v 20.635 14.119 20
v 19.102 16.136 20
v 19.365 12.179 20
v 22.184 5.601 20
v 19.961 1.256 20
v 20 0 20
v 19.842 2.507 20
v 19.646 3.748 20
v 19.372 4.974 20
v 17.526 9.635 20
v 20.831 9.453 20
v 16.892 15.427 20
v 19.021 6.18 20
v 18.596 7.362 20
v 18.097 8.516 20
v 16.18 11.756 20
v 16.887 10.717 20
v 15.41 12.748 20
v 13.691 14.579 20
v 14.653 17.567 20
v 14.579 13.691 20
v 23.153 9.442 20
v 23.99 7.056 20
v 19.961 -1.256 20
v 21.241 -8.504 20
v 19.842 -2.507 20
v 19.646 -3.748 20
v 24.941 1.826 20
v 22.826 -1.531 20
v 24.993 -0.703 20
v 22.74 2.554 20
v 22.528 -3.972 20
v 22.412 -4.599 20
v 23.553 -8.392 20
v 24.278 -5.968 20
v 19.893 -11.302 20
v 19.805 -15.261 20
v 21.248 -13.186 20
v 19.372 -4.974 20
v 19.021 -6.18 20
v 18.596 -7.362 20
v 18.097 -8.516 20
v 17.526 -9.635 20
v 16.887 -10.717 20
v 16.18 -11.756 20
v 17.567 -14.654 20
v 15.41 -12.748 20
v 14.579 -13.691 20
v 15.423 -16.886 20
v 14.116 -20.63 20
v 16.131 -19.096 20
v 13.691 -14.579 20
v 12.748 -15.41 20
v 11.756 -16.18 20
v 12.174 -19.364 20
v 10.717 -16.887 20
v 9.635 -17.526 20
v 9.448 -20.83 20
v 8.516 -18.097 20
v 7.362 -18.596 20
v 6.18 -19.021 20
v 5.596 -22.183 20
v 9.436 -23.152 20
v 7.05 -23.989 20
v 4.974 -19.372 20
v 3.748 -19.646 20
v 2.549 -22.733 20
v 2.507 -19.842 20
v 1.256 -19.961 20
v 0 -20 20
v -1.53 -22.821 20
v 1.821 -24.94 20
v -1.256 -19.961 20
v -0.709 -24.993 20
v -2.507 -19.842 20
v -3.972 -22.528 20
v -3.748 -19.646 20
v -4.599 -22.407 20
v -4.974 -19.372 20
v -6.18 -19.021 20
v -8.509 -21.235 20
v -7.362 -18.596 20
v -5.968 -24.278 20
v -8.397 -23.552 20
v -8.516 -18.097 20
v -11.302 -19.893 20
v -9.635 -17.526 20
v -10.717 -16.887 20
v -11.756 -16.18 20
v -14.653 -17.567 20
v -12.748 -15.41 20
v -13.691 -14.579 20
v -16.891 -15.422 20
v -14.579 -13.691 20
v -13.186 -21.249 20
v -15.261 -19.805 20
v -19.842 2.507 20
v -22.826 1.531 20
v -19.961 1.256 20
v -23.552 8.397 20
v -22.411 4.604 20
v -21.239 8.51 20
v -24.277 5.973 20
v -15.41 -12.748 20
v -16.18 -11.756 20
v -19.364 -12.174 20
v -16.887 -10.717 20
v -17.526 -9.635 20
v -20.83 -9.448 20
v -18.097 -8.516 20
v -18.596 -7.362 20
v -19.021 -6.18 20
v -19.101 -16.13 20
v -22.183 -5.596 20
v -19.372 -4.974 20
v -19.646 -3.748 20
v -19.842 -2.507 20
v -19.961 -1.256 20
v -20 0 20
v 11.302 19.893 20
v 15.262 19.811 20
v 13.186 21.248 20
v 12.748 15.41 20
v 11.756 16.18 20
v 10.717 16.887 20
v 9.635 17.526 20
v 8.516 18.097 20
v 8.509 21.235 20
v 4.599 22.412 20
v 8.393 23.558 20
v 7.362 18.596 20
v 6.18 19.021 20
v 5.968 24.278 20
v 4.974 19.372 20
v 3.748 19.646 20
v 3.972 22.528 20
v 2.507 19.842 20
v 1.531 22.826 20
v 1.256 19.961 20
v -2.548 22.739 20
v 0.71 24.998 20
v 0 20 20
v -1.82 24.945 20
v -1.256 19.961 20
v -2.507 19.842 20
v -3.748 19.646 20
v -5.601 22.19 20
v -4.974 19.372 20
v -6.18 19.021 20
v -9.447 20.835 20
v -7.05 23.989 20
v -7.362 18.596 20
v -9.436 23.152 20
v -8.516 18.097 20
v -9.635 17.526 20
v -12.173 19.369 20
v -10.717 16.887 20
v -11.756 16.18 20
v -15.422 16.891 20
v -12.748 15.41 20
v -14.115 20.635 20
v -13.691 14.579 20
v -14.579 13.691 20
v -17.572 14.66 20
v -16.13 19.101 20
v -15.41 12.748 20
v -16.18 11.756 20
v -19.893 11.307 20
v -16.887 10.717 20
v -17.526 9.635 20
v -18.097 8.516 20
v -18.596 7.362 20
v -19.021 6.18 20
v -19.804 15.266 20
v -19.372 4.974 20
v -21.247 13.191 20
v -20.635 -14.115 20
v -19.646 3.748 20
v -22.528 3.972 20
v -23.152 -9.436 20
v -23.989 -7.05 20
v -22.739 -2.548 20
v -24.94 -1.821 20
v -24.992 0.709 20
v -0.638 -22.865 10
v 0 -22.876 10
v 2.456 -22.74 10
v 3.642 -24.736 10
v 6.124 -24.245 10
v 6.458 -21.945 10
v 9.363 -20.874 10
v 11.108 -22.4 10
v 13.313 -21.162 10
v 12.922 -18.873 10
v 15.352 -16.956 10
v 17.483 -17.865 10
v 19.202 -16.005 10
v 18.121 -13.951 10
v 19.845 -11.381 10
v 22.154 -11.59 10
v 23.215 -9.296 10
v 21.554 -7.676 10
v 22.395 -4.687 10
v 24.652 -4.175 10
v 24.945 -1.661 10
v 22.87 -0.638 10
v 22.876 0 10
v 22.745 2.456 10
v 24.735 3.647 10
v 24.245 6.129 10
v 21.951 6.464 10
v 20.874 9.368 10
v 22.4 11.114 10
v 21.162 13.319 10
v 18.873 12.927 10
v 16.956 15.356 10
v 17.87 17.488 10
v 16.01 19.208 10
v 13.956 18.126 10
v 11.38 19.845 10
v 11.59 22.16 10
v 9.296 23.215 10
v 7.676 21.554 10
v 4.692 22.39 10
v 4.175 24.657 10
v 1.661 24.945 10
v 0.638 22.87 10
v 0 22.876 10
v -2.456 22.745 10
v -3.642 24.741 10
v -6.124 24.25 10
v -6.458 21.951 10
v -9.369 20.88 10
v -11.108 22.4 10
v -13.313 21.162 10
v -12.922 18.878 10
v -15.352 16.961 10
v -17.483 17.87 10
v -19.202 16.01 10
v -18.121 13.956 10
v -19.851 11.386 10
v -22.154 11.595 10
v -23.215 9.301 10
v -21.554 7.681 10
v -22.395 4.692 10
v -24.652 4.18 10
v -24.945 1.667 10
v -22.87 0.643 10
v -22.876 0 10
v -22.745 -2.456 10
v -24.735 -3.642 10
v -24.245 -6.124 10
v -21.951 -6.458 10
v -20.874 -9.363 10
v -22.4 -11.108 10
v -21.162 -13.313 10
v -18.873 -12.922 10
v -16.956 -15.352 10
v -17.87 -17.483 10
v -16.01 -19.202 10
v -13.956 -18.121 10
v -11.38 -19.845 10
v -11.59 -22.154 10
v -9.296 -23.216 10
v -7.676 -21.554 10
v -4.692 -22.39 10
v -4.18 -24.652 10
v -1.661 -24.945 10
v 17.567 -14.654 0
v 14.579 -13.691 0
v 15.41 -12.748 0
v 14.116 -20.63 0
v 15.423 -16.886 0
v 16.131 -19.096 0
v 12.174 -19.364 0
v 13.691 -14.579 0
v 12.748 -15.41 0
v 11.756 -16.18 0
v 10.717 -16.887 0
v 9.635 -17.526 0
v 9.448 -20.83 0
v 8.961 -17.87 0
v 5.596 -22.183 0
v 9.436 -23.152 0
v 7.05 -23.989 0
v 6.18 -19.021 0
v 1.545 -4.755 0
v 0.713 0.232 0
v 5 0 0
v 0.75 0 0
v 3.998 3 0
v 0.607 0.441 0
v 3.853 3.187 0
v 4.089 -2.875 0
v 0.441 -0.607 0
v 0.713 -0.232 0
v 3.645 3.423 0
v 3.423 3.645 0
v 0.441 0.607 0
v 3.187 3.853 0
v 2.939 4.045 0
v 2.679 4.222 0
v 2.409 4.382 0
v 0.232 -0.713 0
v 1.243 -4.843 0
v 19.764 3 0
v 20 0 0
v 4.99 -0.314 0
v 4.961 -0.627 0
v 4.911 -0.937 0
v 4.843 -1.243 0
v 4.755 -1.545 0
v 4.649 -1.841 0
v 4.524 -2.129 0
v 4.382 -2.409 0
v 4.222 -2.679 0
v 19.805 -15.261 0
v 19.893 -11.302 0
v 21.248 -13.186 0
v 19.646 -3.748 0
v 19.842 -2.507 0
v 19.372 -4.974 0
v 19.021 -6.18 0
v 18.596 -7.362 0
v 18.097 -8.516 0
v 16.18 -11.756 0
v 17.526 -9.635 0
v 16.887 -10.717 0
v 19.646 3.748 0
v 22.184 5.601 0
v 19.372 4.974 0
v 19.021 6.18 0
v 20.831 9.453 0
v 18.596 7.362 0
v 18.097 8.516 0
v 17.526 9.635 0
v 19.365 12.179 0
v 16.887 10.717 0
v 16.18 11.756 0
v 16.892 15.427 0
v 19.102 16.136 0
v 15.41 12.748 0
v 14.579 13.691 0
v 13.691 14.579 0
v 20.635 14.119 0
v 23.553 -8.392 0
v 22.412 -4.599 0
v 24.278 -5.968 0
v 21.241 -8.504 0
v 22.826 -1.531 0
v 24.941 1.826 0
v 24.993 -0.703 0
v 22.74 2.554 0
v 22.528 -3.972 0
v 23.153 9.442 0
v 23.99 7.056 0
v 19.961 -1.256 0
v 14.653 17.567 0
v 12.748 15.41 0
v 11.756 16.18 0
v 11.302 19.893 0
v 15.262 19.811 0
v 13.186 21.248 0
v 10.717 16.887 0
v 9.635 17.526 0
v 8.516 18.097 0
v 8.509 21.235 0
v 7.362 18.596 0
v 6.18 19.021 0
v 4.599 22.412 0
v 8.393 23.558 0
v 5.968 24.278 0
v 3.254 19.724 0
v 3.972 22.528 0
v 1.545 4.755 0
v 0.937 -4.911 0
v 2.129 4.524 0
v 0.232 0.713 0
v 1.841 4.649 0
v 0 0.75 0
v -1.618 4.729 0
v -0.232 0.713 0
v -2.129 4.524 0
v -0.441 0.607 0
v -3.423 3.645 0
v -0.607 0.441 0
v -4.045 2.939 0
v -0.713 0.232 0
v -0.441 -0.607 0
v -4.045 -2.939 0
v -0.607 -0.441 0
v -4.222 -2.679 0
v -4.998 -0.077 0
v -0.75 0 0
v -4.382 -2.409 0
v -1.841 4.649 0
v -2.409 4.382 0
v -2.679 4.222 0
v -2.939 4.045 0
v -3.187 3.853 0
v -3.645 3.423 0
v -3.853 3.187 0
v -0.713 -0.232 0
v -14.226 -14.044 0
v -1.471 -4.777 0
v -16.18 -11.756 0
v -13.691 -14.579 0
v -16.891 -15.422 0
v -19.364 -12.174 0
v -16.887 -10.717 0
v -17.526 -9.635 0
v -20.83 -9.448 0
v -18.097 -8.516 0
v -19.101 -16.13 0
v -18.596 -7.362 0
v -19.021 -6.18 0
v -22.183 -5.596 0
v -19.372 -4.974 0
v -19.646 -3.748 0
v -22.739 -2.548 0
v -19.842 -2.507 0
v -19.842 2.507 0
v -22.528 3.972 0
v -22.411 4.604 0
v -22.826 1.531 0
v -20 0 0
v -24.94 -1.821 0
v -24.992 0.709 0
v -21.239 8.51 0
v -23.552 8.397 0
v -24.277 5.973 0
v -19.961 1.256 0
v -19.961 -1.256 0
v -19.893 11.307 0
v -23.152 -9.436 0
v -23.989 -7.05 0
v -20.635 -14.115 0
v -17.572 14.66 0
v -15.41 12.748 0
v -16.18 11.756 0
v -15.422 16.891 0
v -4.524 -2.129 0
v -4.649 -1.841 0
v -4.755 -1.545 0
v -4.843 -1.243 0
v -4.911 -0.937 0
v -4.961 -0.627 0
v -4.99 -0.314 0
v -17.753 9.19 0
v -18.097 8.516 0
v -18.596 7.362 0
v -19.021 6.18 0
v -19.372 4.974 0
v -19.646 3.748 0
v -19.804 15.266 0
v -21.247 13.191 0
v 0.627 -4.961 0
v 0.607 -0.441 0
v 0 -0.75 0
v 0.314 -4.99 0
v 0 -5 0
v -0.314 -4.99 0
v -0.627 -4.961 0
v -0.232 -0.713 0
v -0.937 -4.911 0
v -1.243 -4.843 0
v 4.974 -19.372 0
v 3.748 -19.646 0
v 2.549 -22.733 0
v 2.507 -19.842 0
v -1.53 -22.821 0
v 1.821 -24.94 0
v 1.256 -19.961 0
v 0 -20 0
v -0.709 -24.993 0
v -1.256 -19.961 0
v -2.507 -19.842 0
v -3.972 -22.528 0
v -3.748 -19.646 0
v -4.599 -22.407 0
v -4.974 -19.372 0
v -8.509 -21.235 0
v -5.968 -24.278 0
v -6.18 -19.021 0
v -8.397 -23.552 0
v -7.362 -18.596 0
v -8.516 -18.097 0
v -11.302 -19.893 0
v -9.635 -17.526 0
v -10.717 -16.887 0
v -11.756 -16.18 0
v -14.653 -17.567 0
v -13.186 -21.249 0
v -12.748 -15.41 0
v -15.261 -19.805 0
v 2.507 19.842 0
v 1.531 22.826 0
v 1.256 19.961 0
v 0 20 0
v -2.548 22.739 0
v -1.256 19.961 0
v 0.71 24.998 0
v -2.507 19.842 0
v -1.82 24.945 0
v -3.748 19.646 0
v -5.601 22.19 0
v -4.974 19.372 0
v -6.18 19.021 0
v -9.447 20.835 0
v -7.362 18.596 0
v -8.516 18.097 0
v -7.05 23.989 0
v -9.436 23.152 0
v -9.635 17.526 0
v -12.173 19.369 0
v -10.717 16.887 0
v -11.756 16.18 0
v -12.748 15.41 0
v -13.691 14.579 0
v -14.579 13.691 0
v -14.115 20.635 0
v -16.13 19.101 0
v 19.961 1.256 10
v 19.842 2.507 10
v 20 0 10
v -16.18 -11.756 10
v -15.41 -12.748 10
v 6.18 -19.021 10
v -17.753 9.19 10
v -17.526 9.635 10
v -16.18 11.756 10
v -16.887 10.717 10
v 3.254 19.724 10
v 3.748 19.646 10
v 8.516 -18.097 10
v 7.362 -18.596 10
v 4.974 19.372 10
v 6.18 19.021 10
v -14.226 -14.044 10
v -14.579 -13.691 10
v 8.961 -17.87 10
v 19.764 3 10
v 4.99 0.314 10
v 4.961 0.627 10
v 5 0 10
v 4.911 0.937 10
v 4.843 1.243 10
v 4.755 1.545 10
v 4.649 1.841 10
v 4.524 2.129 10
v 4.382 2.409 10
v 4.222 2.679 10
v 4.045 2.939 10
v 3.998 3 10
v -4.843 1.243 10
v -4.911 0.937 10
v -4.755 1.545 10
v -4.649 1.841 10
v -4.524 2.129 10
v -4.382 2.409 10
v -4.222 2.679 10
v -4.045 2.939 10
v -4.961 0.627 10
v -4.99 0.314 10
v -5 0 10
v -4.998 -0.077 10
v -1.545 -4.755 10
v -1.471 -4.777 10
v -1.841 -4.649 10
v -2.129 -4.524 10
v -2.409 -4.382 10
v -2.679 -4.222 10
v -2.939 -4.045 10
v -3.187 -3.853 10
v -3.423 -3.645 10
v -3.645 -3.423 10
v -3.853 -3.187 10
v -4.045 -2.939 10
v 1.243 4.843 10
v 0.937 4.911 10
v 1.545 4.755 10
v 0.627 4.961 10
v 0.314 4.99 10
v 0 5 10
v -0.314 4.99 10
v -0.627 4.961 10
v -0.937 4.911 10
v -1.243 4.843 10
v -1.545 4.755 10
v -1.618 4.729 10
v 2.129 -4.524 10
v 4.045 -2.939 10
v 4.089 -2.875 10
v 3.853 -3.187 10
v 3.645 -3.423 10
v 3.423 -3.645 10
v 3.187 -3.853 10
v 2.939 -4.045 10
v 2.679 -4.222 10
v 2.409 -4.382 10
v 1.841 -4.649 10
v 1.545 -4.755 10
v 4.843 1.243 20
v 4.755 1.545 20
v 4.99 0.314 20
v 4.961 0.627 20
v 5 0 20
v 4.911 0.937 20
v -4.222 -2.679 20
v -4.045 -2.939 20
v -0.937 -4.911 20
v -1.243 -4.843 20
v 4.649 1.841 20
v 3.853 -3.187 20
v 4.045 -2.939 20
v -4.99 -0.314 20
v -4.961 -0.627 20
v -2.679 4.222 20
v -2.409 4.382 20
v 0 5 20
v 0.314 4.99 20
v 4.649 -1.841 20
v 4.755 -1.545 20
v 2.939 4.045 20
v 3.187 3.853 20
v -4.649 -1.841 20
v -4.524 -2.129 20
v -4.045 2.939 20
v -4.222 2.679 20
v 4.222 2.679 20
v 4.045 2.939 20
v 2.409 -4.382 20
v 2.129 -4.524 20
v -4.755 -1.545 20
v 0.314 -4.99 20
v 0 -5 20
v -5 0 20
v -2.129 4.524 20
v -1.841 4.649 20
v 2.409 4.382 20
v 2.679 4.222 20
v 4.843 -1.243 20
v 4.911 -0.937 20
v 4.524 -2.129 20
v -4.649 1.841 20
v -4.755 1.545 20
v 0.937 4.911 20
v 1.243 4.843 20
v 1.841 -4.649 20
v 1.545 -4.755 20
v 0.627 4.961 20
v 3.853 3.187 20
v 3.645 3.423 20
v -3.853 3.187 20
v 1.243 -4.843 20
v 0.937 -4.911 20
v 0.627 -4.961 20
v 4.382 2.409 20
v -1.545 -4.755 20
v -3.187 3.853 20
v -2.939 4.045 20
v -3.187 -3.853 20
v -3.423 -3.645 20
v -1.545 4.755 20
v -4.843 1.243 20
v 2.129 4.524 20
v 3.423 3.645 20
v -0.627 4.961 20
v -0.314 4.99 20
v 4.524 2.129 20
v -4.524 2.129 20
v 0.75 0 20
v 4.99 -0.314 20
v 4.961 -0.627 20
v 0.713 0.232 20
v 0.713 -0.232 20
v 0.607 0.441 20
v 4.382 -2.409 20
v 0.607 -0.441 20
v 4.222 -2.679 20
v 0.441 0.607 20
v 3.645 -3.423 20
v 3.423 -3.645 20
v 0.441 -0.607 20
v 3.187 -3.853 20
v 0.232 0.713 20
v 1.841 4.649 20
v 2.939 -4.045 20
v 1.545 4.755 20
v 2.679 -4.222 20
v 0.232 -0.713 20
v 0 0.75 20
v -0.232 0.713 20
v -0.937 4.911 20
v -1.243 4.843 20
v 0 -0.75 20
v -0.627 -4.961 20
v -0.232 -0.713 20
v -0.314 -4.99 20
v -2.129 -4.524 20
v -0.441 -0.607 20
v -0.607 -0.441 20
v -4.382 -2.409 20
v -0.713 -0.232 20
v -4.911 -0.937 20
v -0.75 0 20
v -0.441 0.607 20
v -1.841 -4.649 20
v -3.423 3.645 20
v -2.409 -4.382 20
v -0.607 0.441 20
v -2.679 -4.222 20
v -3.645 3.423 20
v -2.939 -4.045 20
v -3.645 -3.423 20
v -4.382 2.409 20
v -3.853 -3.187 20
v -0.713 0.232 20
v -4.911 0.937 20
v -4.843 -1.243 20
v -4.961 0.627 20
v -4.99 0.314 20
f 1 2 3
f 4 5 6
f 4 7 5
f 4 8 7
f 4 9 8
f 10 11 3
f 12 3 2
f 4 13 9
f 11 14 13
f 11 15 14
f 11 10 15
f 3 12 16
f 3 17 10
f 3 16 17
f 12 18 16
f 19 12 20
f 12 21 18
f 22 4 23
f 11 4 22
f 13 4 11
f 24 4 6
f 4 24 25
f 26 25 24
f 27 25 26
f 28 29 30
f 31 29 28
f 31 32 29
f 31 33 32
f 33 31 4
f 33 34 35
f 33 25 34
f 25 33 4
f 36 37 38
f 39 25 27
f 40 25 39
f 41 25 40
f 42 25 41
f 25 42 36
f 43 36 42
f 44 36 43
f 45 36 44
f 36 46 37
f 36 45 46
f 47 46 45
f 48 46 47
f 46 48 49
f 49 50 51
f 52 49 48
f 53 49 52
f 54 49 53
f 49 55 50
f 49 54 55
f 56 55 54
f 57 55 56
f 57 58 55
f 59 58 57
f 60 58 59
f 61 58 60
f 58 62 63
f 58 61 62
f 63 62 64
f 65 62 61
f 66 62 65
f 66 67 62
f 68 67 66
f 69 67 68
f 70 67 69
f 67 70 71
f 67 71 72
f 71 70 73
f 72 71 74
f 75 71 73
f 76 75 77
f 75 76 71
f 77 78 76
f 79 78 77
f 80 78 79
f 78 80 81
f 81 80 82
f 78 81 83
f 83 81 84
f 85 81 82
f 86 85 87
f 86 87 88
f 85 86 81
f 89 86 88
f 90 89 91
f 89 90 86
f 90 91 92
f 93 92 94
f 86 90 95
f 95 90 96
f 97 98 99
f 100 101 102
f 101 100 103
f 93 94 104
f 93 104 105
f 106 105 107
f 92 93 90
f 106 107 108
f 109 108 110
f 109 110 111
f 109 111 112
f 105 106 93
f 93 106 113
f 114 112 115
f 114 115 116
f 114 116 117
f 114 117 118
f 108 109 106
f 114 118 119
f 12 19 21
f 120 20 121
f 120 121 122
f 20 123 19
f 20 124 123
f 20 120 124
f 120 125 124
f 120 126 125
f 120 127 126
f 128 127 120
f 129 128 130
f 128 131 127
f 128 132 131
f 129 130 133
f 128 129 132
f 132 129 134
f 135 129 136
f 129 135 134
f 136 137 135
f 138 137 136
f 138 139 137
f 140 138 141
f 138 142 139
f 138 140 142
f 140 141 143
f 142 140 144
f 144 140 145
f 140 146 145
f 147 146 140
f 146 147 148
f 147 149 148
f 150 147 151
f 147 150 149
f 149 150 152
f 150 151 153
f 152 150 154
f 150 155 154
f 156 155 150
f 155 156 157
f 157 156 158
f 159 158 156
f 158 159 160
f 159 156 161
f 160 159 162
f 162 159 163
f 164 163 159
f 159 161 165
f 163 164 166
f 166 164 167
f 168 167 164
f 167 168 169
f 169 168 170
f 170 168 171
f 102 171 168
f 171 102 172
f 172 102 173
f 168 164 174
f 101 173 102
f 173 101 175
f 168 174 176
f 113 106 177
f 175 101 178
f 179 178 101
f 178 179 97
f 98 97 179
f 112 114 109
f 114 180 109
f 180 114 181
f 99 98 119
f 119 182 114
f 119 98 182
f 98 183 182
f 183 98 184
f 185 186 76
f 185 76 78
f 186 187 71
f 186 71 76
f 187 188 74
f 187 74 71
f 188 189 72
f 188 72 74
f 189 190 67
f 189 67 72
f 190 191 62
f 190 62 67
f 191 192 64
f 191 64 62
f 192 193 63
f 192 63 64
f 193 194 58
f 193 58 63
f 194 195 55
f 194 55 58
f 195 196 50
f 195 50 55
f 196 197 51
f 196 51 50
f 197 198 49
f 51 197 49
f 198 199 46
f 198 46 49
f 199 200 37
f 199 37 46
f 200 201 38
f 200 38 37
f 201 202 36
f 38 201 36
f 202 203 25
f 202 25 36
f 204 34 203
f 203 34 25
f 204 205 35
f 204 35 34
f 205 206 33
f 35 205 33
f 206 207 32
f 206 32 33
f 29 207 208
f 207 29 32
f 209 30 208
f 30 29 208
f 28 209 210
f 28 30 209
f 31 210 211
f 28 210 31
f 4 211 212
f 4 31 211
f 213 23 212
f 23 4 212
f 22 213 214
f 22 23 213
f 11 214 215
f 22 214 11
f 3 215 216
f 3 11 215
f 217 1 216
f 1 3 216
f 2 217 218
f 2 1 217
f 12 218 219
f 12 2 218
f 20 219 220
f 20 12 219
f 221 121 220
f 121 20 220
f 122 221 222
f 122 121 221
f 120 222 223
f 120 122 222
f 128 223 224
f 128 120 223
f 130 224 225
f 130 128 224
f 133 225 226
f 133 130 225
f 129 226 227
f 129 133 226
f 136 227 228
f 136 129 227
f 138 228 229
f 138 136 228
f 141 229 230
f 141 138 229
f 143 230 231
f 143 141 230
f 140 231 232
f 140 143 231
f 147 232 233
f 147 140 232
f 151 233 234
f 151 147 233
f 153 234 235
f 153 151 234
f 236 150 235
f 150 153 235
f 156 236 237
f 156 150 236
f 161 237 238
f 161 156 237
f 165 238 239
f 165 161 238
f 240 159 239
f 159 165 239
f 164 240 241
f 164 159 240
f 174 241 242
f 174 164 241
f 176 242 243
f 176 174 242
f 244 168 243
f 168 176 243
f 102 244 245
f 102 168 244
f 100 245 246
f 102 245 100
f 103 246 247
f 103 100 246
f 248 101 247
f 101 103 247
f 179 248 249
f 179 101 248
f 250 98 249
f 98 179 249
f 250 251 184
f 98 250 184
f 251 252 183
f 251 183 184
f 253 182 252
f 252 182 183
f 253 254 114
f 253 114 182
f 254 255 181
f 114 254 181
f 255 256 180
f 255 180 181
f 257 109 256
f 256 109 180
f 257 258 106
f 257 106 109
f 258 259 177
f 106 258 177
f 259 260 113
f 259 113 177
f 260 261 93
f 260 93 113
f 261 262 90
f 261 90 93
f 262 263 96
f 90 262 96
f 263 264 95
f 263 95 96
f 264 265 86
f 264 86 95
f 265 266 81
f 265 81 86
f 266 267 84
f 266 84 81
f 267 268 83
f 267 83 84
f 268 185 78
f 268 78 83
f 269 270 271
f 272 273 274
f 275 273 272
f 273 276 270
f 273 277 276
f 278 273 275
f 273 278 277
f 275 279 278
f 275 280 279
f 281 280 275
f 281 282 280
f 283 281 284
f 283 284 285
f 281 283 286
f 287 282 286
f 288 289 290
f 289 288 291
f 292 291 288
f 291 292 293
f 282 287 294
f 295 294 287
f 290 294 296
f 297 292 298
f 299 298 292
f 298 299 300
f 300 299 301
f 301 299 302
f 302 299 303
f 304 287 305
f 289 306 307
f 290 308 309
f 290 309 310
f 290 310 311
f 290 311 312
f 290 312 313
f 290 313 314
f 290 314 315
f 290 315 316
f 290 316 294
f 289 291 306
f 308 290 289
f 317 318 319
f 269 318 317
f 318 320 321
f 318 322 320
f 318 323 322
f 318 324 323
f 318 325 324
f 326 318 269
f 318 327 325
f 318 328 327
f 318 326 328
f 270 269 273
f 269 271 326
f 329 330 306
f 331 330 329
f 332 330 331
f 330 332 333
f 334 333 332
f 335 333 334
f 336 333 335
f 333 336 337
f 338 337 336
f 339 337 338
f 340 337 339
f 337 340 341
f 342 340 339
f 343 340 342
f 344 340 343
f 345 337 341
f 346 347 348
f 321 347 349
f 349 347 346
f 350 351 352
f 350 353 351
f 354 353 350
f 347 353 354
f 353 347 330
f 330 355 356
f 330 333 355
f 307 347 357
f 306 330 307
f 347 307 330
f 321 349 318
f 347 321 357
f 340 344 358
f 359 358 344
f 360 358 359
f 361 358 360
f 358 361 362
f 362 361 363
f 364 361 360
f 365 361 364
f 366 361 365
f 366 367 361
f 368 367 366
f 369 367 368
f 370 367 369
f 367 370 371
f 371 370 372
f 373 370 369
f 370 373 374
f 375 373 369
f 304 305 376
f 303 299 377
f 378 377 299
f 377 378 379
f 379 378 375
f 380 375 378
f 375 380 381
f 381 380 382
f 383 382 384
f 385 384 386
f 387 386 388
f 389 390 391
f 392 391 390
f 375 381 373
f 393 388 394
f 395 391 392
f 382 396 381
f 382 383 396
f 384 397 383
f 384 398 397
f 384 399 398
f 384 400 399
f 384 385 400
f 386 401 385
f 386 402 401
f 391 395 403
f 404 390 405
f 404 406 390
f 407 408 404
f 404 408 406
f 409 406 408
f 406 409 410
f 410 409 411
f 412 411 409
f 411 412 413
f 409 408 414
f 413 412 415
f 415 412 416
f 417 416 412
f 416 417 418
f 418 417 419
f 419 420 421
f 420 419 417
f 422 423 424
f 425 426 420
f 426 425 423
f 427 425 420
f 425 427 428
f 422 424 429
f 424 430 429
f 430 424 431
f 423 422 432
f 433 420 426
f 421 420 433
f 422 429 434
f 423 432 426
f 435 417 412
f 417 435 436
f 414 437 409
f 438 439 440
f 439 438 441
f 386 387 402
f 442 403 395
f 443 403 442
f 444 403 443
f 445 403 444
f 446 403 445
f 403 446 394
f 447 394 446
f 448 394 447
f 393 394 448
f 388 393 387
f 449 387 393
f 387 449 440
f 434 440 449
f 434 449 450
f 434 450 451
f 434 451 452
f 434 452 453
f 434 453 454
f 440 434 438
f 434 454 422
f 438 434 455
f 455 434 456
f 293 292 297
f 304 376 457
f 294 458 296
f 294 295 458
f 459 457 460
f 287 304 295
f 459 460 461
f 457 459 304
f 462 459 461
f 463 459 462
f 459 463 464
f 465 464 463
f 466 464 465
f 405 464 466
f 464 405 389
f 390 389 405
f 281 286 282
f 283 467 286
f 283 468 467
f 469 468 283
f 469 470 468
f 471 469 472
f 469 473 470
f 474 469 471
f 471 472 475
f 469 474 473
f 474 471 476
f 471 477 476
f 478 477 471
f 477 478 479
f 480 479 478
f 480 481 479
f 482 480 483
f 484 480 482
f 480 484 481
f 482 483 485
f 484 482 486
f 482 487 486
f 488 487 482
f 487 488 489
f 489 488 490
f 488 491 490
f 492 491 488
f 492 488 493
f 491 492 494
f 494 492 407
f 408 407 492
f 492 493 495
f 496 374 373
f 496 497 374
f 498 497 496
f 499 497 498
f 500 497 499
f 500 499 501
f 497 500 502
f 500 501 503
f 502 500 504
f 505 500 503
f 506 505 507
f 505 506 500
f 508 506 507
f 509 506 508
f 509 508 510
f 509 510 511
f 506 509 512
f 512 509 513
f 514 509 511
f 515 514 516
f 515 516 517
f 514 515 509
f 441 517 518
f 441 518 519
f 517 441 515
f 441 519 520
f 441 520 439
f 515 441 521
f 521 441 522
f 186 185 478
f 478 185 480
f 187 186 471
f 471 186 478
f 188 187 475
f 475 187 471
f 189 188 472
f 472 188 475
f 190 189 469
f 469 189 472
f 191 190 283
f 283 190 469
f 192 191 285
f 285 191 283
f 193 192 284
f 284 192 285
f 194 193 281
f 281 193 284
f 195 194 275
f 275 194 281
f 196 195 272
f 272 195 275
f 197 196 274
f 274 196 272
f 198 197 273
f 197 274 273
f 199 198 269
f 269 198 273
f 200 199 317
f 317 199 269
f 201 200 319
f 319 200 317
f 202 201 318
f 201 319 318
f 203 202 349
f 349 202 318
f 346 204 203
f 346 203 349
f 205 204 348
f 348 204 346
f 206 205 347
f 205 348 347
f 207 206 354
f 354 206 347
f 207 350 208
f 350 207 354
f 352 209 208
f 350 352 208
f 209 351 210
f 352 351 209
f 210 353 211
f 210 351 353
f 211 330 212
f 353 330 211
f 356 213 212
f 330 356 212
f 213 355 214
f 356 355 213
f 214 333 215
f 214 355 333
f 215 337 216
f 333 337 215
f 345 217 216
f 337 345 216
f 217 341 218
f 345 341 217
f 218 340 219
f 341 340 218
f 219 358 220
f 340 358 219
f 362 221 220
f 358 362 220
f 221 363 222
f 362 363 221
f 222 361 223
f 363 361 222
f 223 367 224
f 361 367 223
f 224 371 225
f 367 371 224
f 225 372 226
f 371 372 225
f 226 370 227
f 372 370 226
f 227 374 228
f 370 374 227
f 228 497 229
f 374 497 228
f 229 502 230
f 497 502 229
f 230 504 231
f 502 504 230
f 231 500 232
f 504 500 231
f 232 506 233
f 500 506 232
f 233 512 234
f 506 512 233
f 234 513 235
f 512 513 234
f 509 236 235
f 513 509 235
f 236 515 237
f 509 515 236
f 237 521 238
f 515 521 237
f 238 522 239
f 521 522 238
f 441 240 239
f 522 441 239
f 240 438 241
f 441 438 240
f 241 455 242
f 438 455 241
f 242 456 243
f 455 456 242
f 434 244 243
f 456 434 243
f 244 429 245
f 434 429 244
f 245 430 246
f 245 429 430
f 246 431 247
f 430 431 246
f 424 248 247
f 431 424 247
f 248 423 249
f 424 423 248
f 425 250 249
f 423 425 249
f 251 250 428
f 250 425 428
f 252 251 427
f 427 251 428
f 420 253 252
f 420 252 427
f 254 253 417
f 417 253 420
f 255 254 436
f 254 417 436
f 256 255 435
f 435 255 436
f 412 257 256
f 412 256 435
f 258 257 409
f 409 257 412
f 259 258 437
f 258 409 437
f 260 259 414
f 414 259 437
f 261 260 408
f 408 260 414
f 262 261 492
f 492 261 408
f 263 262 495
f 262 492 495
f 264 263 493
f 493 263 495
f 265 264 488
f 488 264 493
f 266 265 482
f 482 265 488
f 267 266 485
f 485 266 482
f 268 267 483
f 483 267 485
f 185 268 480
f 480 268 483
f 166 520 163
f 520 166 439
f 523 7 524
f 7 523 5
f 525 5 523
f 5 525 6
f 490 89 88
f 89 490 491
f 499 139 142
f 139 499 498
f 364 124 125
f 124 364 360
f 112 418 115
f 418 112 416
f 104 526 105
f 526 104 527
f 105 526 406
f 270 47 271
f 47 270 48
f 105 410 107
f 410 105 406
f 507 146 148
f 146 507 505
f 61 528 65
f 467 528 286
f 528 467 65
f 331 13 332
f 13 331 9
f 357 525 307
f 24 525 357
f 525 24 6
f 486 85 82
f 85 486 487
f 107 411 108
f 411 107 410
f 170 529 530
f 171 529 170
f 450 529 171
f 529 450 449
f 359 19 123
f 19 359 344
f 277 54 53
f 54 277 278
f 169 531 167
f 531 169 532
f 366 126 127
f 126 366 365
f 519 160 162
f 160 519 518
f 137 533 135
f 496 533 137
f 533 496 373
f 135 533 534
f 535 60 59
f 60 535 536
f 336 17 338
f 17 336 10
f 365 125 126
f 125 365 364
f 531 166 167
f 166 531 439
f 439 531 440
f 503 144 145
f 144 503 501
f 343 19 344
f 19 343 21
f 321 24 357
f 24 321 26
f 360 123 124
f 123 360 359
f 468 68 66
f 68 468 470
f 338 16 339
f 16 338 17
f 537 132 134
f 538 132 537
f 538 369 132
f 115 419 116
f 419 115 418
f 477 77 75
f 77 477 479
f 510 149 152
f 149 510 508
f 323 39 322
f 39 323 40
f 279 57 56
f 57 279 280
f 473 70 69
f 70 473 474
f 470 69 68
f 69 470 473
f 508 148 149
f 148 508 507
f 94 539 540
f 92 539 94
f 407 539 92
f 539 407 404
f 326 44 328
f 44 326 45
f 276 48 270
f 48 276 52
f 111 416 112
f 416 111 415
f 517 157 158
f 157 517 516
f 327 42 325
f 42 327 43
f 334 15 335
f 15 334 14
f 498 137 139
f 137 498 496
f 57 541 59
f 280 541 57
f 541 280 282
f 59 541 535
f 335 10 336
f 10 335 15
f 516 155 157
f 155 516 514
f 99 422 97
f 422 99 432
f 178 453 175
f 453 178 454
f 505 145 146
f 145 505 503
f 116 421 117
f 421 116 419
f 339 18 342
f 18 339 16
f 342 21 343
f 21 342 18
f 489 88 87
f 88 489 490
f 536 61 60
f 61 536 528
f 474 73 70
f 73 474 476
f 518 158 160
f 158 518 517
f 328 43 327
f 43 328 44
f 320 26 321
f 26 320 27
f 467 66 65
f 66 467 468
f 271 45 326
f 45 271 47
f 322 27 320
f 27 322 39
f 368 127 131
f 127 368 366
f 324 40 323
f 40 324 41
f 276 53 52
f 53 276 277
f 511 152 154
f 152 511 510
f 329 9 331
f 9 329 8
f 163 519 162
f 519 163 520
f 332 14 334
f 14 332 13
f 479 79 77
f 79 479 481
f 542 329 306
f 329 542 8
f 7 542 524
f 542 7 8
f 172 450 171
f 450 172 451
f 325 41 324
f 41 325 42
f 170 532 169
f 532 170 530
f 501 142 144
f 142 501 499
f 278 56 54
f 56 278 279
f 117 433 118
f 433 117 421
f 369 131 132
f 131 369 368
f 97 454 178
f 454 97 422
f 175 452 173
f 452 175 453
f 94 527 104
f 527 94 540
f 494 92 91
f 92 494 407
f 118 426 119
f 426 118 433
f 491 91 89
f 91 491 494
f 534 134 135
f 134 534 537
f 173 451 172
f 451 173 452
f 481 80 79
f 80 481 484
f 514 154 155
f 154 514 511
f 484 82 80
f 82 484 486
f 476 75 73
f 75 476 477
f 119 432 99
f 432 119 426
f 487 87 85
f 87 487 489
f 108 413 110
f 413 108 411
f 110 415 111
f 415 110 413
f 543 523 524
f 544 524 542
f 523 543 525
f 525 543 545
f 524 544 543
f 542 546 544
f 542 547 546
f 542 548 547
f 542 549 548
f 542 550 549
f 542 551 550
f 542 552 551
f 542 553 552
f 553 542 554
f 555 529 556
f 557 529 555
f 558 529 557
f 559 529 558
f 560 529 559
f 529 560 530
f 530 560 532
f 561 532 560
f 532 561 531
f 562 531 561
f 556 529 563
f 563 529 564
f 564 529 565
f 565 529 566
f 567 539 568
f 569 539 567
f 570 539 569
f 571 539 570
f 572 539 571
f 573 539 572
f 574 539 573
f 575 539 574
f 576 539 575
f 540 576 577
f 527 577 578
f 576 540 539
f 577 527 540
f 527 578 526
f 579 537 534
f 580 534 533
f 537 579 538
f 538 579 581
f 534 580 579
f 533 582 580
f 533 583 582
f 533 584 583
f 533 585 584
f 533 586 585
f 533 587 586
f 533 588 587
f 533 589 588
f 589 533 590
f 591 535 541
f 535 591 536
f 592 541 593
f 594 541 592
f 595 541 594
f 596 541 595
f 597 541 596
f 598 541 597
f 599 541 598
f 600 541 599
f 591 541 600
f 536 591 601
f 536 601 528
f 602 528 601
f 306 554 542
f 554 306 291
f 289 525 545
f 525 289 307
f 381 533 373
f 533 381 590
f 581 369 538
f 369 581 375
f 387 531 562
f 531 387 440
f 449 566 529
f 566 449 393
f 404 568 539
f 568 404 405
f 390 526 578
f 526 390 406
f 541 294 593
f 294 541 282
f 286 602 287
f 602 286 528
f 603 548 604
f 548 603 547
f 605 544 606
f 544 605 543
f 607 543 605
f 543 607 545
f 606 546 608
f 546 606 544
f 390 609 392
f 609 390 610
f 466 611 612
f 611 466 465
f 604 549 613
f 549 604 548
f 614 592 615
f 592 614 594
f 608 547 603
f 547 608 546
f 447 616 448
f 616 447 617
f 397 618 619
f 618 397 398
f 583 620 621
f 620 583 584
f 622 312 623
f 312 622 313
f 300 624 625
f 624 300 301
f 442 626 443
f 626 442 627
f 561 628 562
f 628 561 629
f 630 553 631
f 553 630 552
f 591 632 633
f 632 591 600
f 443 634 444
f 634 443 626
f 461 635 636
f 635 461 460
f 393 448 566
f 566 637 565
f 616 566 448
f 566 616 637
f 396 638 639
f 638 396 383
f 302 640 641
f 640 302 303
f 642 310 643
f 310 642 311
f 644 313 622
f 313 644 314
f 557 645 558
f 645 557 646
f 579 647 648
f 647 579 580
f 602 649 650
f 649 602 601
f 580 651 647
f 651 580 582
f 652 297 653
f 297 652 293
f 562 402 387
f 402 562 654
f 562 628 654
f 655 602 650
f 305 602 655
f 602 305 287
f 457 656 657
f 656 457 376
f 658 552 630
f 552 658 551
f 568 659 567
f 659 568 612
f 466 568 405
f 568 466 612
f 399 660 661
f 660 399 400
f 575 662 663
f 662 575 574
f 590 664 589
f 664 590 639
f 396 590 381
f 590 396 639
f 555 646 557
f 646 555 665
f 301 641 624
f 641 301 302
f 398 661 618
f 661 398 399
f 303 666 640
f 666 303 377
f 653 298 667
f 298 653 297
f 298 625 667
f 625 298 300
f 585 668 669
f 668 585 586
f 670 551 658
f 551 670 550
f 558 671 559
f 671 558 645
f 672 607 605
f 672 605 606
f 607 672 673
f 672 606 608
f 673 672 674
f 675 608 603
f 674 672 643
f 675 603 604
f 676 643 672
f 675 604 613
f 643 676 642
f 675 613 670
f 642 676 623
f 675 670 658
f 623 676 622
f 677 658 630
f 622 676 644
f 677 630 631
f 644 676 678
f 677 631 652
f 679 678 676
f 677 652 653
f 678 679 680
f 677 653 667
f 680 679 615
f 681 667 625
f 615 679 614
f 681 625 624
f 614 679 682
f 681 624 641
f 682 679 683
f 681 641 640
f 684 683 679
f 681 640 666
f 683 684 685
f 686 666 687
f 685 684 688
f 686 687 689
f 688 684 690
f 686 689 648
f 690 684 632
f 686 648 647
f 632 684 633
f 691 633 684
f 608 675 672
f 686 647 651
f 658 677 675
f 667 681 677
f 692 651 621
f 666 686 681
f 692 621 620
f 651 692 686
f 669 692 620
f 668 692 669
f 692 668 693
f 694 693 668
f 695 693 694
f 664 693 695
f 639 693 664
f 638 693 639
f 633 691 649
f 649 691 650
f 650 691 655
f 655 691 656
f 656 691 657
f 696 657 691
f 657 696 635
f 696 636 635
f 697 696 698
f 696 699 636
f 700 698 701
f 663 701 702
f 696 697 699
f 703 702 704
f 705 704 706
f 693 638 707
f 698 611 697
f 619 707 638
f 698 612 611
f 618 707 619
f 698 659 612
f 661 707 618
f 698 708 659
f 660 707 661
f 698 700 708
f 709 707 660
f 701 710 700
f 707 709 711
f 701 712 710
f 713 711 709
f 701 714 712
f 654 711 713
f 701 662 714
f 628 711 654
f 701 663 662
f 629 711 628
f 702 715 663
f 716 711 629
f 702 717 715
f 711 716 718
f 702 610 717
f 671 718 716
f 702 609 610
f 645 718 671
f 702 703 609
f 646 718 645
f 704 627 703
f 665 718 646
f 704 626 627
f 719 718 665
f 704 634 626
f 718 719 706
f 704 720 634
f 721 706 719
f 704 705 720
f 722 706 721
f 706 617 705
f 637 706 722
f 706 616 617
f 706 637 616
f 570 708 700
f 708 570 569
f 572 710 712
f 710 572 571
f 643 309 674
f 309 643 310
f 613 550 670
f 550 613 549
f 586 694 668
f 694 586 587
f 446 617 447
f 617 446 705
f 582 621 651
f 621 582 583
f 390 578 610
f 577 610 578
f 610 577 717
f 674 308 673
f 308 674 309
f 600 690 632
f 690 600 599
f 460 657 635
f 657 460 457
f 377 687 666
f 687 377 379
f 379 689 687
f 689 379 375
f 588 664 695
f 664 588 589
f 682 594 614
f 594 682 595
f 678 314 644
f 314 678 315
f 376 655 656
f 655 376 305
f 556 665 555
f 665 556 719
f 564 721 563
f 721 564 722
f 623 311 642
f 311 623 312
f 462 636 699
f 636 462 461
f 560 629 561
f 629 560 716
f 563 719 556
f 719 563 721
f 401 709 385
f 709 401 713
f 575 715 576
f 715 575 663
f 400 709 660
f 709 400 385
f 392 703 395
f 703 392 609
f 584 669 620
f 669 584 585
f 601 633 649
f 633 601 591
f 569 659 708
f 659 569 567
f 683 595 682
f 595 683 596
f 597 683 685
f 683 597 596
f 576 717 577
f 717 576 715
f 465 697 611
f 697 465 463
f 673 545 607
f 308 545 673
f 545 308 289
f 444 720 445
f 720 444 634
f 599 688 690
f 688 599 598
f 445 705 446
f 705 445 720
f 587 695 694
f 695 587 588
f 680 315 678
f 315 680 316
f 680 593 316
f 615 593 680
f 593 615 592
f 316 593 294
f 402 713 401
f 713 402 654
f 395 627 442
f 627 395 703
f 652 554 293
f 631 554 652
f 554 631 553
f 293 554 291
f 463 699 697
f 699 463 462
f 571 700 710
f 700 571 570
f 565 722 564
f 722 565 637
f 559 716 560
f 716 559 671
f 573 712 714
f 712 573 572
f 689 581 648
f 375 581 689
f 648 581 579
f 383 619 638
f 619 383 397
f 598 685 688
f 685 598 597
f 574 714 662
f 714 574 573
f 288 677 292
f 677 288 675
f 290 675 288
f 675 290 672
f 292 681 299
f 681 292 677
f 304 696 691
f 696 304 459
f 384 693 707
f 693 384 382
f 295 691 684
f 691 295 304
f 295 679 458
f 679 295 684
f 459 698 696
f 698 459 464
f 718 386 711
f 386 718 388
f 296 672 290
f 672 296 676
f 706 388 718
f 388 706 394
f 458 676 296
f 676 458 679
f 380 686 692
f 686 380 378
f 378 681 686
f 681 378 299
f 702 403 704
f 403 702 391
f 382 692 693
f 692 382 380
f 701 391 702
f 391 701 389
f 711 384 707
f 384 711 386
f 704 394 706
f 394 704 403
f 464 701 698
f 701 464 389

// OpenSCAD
// левое колесо
wheel_with_axis();
// правое колесо
//mirror([0, 0, -1]) wheel_with_axis();


/** Колесо с отверстием под ось */
module wheel_with_axis() {
  difference() {
    wheel();
    generic_axis();
    //motor1_axis();
    //motor2_axis();
  }
}

/** Колесо */
module wheel() {

  // внешний обод
  difference() {
    // лысая резина
    //cylinder(h=20, r=25, $fn=100);
    // рельефный протектор
    translate([0, 0, 10]) {
      linear_extrude(height=10, twist=10) 
          import(file = "протектор.dxf");
      mirror([0, 0, -1]) 
        linear_extrude(height=10, twist=10) 
          import(file = "протектор.dxf");
    }

    translate([0, 0, -1])
      cylinder(h=22, r=20, $fn=100);
  }

  // внутренний вал
  cylinder(h=20, r=5, $fn=100);

  // спицы
  for(angle = [0, 72, 144, 216, 288]) {
    rotate(a=angle) 
      cube([22, 3, 10]);
  }
}

/**
 * Просто круглая ось, по умолчанию 
 * диаметр 1,5мм 
 */
module generic_axis(length=22, radius=0.75) {
  translate([0,0,-1])
    cylinder(h=length, r=radius, $fn=20);
}

/** 
 * Ось для для мотора 1:
 * GM7 - Gear Motor 7 - Baby GM3 (прямой, белый)
 * www.robotshop.com/en/solarbotics-gm7-gear-motor-7.html
 *
 * Диаметр оси мотора 2мм, сделаем модель 1,5мм.
 */
module motor1_axis(length=22) {
  // 1,5мм диаметр
  generic_axis(length, 0.75);
}

/** 
 * Ось для для мотора 2:
 * Pololu 4.5V, 80rpm Right Angle (прямой, желтый)
 * www.robotshop.com/en/solarbotics-gm7-gear-motor-7.html
 *
 * Диаметр оси мотора 3мм, срез с одного бока 0,5мм.
 */
module motor2_axis(length=22) {
  // диаметр 3мм, срез с одного бока 0,5мм
  translate([0,0,-1])
  difference() {
    cylinder(h=length, r=1.5, $fn=20);
    // 1,5 мм "вниз" по y (совместить куб с цилиндром), 
    // 1 "вправо" по x (срезать справа 0,5мм: 1,5-0,5=1)
    translate([1, -1.5, 0]) 
      cube([2, 3, length]);
  }
}
